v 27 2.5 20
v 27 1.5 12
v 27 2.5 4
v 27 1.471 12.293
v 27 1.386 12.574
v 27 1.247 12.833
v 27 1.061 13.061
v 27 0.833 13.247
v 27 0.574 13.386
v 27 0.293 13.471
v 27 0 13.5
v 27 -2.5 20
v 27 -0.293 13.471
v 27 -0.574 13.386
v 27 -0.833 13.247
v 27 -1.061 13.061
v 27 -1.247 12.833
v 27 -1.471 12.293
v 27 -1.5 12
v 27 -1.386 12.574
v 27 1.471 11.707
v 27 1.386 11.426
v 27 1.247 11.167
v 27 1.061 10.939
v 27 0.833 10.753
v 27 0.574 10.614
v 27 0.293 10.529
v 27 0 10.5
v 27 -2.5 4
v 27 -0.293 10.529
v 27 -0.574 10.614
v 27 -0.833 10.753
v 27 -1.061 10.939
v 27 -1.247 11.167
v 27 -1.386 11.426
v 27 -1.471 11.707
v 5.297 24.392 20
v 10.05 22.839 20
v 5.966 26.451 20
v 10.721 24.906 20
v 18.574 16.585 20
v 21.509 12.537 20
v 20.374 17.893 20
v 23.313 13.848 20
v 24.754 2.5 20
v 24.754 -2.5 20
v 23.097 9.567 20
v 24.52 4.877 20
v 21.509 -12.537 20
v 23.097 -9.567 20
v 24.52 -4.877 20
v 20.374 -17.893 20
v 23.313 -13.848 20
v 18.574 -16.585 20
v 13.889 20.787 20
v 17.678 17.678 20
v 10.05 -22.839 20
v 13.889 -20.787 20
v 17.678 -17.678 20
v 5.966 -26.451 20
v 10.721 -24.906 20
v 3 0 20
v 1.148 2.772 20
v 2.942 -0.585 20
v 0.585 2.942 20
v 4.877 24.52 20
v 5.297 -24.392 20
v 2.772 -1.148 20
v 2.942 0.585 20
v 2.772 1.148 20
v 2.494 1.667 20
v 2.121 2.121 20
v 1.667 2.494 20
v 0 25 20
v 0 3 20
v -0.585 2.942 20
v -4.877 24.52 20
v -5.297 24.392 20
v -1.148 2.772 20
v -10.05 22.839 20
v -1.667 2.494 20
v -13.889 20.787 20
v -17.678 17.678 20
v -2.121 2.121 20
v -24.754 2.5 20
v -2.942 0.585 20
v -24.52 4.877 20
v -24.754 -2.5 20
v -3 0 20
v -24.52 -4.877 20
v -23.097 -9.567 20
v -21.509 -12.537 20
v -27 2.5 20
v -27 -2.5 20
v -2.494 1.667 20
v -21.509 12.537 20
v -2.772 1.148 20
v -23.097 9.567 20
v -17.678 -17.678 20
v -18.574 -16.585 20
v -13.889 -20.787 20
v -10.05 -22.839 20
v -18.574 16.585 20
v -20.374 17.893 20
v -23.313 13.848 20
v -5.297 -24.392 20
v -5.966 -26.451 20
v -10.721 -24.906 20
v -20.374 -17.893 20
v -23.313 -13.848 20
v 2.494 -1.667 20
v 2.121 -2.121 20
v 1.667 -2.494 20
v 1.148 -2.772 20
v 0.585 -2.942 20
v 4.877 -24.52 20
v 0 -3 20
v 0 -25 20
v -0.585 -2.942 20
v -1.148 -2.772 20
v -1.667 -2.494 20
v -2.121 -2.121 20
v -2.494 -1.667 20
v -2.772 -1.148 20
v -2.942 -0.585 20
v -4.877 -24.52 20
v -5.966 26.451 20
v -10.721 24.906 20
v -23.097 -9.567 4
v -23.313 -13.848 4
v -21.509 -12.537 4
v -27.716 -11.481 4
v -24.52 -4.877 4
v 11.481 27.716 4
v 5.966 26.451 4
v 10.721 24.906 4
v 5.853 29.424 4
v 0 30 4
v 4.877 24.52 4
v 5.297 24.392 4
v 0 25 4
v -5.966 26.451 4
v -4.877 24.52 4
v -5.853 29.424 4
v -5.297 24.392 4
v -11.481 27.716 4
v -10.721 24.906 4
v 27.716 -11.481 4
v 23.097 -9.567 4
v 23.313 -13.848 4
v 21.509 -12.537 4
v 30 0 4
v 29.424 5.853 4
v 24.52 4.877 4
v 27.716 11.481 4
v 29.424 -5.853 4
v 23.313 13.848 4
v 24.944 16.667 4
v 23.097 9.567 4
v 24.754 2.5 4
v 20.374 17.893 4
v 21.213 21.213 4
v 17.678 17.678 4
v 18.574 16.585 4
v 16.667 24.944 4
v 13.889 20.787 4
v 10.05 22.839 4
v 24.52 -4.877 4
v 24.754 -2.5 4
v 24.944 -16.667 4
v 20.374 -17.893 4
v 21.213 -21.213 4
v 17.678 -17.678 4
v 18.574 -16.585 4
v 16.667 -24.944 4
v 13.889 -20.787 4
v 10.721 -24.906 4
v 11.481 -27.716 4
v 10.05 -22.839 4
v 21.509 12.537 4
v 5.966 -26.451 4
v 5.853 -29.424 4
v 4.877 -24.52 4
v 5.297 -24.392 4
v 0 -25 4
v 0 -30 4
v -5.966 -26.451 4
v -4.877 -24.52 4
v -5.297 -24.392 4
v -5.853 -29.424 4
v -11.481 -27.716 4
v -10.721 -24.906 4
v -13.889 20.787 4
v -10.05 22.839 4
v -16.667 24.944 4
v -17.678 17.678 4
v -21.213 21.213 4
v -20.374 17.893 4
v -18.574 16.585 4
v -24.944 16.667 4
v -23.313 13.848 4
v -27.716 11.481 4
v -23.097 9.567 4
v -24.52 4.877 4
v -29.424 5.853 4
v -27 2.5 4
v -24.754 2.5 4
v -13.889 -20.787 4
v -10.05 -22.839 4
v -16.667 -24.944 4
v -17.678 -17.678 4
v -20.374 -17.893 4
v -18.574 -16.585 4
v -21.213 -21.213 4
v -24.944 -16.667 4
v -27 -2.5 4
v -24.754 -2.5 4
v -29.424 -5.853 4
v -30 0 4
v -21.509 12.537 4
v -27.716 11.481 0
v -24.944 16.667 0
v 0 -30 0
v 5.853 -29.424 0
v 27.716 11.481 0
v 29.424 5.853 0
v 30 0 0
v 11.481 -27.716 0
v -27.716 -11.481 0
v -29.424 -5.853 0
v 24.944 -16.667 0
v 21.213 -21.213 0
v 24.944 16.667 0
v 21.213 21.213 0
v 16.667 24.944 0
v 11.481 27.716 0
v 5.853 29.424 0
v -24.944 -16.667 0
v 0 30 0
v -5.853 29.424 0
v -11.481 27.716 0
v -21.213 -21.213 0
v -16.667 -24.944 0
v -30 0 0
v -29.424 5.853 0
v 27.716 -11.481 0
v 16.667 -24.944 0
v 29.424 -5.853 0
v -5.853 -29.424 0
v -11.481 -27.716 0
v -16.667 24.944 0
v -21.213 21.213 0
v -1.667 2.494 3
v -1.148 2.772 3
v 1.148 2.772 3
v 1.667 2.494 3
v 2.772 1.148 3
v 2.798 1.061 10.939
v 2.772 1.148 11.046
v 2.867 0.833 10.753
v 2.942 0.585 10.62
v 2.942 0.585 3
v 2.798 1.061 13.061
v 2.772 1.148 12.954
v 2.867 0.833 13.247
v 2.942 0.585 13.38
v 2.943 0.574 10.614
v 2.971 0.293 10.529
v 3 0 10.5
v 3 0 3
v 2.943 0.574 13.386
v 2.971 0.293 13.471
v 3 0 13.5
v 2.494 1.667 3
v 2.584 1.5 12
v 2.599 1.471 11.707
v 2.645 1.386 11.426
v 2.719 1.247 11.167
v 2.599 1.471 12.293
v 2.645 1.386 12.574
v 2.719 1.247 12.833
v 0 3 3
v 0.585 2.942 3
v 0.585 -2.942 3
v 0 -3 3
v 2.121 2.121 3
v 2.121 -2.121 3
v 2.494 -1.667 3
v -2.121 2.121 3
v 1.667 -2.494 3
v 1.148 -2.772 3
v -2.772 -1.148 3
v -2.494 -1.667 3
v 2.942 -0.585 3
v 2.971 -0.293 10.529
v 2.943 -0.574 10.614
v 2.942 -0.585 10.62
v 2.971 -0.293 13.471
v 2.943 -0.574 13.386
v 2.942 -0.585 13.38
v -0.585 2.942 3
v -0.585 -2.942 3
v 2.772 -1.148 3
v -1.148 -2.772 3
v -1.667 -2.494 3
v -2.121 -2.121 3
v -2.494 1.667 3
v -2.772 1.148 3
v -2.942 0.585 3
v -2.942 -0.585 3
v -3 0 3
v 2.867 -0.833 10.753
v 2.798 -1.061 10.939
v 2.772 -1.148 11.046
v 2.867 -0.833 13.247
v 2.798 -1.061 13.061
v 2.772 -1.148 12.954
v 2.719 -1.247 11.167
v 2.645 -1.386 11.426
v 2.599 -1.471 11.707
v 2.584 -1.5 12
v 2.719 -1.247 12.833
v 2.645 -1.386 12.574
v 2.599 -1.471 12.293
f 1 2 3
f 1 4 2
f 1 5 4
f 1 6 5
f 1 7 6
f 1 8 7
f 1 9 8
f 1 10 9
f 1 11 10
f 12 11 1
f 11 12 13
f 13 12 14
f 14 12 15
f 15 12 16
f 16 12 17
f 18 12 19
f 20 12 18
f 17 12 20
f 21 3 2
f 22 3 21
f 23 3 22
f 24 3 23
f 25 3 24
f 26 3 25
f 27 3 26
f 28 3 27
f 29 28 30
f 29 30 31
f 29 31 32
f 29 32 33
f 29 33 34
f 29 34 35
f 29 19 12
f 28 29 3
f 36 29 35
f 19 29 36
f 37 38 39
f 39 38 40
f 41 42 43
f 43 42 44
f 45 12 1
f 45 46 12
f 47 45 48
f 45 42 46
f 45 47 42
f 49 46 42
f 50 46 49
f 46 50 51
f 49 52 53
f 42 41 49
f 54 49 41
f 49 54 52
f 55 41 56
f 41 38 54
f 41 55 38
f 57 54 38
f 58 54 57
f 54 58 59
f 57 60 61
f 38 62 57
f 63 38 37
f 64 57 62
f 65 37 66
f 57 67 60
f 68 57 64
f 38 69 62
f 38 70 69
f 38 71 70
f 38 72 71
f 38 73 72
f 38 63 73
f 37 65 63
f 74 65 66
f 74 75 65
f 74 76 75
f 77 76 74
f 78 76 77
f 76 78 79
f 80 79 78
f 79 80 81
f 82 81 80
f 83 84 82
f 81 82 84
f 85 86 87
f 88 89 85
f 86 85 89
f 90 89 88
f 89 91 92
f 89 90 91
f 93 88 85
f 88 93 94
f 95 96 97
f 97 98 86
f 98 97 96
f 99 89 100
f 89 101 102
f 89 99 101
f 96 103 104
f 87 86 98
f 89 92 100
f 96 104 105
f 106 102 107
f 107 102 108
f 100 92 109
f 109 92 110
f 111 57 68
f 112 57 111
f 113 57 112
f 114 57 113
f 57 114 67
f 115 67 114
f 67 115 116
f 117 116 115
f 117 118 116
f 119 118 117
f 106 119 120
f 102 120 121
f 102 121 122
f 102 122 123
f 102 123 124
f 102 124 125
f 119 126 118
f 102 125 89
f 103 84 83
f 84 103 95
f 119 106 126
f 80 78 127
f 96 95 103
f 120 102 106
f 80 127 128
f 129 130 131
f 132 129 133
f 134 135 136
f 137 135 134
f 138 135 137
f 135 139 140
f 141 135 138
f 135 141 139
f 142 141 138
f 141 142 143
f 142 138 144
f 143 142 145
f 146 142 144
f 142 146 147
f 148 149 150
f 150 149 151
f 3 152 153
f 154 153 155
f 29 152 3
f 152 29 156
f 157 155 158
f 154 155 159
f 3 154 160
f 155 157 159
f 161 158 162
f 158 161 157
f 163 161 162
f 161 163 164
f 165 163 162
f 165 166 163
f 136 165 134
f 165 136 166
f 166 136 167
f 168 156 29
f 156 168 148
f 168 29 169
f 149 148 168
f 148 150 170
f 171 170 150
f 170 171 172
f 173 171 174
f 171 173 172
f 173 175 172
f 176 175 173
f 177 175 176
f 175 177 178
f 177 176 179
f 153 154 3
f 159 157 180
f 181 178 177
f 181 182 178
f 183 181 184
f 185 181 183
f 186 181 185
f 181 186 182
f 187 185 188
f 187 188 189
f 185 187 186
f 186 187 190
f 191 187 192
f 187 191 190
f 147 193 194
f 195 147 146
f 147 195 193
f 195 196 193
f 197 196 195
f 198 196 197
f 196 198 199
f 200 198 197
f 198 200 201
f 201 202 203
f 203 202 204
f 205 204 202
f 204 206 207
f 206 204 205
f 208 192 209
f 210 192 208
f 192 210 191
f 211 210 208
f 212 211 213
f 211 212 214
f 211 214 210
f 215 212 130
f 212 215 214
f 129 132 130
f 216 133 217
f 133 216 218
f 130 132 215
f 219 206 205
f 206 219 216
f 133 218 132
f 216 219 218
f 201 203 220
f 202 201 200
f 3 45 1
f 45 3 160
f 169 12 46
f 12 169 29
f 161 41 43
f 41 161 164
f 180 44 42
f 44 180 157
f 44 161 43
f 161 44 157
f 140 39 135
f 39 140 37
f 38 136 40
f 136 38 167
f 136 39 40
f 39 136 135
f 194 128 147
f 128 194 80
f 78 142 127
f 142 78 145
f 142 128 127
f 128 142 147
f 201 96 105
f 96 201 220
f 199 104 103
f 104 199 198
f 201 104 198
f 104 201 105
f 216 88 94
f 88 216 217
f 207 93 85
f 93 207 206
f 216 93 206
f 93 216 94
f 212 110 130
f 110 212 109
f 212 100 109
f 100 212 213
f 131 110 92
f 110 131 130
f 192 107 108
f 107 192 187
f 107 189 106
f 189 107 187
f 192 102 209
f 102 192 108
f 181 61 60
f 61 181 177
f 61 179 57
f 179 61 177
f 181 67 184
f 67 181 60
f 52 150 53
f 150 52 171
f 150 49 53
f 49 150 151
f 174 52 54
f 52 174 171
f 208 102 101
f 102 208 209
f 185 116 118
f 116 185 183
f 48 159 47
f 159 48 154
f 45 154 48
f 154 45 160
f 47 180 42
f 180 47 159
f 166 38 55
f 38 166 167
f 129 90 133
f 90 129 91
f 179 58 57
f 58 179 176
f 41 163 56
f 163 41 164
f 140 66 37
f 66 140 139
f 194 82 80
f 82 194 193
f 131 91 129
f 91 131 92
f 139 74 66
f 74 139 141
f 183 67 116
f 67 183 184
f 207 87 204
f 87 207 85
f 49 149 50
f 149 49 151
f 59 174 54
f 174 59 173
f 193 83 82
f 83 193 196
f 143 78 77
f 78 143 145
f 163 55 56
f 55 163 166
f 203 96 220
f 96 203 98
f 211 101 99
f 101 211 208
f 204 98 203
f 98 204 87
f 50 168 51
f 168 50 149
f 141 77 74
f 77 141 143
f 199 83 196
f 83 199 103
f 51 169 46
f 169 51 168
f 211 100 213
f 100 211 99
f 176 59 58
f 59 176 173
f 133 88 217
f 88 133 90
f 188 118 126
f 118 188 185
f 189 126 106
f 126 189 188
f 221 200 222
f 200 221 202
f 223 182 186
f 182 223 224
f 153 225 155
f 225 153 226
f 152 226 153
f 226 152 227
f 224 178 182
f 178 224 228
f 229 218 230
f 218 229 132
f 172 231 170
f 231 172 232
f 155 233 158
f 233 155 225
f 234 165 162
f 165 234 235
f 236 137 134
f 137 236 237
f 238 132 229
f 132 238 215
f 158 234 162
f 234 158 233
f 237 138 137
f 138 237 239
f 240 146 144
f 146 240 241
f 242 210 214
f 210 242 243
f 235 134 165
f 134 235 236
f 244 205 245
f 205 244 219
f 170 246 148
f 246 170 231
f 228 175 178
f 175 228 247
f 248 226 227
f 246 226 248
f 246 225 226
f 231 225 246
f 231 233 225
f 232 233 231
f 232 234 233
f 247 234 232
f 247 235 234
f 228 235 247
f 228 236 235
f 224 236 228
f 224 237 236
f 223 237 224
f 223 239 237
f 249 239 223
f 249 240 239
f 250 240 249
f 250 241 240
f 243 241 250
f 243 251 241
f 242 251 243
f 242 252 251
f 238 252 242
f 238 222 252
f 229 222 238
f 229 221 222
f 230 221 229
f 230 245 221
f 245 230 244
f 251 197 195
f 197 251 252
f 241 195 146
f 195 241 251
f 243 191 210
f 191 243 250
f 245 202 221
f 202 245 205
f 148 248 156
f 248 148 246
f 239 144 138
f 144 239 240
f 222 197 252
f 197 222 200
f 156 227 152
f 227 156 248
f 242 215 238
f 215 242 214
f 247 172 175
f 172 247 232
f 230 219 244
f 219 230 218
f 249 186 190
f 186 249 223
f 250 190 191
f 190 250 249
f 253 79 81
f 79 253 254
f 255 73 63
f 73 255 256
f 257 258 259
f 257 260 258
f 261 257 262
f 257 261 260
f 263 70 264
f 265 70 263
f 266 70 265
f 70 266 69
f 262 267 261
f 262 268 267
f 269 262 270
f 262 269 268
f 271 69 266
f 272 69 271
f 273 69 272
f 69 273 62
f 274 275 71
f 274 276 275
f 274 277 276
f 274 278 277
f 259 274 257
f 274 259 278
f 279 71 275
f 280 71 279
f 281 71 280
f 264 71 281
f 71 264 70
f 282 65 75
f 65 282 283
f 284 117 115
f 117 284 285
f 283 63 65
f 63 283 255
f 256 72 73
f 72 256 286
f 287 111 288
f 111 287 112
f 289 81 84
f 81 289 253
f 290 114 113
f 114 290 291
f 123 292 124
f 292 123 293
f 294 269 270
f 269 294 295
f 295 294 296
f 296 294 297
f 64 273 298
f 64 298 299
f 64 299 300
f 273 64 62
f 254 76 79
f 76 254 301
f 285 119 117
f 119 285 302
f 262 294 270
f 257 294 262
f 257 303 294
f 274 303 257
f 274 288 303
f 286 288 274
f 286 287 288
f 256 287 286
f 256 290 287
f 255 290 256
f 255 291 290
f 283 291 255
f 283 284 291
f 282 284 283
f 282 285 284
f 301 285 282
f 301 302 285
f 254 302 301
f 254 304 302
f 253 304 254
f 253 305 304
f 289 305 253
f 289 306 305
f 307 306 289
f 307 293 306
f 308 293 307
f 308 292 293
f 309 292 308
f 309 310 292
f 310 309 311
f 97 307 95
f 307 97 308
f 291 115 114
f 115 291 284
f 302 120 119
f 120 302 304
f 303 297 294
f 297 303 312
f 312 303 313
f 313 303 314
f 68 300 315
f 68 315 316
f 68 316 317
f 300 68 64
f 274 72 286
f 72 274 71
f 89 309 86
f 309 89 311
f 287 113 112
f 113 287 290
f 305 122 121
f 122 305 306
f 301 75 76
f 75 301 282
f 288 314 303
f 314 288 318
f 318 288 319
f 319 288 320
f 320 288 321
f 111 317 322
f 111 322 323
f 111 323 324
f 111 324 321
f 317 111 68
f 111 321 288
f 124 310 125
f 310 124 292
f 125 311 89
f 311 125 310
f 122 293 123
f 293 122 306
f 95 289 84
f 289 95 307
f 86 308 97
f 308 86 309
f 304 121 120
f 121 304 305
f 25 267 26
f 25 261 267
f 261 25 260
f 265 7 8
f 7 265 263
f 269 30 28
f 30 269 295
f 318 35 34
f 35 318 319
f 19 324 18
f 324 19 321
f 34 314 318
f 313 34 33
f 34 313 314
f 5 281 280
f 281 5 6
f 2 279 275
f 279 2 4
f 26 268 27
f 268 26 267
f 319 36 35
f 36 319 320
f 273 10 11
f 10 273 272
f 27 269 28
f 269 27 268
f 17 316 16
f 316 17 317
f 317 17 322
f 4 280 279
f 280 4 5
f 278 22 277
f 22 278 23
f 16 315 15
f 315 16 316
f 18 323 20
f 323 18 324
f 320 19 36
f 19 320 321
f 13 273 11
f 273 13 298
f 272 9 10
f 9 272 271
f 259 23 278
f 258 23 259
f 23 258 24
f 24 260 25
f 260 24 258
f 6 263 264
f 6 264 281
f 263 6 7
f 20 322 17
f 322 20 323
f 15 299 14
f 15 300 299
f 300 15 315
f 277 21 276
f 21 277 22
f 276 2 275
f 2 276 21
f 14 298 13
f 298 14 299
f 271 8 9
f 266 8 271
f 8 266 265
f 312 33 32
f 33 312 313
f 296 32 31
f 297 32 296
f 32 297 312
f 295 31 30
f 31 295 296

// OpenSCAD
$fn = 32;

// ----------------------------------------------------------------------
// Control knob: skirt knob with grip ribs
// ----------------------------------------------------------------------

// --- parameters (mm) ---
skirt_d = 60;             // skirt diameter
skirt_t = 4;              // skirt thickness
rib_w = 5;                // grip rib width
rib_out = 3;              // grip rib radial protrusion
n_ribs = 10;              // number of grip ribs
knob_d = 50;              // knob body diameter
knob_h = 16;              // knob body height
bore_d = 6;               // shaft bore diameter
set_d = 3;                // set screw bore diameter

rib_step = 360 / n_ribs;  // rib angular step
total_h = skirt_t + knob_h;  // overall height

difference() {
  union() {
    translate([0, 0, skirt_t]) cylinder(h = knob_h, d = knob_d);
    cylinder(h = skirt_t, d = skirt_d);
    for (i = [0 : n_ribs - 1])
      rotate([0, 0, i * rib_step])
        translate([knob_d / 2 - 1, -rib_w / 2, skirt_t])
          cube([rib_out, rib_w, knob_h]);
  }
  translate([0, 0, skirt_t - 1]) cylinder(h = knob_h + 2, d = bore_d);
  translate([-1, 0, skirt_t + knob_h / 2]) rotate([0, 90, 0])
    cylinder(h = knob_d / 2 + bore_d / 2 + 2, d = set_d);
}
